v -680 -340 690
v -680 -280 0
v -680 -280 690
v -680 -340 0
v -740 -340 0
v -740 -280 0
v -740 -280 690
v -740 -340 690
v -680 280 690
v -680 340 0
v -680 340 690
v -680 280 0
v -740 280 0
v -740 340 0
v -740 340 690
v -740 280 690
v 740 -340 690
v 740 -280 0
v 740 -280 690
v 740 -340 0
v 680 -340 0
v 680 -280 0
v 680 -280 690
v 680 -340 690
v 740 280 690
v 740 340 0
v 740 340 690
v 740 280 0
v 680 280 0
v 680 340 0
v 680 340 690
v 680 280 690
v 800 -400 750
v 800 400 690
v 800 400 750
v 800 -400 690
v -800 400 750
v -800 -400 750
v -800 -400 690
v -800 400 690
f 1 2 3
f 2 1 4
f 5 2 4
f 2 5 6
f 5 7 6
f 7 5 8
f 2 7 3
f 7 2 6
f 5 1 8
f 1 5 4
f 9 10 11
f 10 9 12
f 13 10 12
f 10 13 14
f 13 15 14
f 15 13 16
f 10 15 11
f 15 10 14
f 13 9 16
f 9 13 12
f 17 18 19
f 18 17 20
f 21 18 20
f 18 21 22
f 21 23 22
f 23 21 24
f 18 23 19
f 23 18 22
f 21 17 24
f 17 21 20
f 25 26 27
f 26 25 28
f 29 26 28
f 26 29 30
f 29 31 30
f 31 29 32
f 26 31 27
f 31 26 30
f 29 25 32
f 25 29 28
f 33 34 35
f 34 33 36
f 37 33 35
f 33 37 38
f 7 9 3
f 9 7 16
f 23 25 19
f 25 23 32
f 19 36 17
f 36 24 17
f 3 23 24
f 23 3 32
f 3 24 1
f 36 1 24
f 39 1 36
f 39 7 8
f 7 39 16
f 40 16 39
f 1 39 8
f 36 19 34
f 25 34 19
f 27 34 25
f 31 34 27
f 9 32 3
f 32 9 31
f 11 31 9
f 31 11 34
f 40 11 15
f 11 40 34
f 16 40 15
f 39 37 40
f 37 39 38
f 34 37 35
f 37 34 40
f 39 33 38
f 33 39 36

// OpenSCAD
// Proportion sketch for the workstation desk.
// Transcribed to DESK in src/components/process/scene/layout.ts.

top_w   = 1600;  // mm
top_d   =  800;
top_t   =   60;
height  =  720;
leg     =   60;
inset   =   90;  // leg inset from each corner

module desk_top() {
  translate([0, 0, height]) cube([top_w, top_d, top_t], center = true);
}

module desk_legs() {
  for (sx = [-1, 1], sy = [-1, 1])
    translate([sx * (top_w / 2 - inset), sy * (top_d / 2 - inset), height / 2])
      cube([leg, leg, height], center = true);
}

module desk() { desk_top(); desk_legs(); }

desk();
